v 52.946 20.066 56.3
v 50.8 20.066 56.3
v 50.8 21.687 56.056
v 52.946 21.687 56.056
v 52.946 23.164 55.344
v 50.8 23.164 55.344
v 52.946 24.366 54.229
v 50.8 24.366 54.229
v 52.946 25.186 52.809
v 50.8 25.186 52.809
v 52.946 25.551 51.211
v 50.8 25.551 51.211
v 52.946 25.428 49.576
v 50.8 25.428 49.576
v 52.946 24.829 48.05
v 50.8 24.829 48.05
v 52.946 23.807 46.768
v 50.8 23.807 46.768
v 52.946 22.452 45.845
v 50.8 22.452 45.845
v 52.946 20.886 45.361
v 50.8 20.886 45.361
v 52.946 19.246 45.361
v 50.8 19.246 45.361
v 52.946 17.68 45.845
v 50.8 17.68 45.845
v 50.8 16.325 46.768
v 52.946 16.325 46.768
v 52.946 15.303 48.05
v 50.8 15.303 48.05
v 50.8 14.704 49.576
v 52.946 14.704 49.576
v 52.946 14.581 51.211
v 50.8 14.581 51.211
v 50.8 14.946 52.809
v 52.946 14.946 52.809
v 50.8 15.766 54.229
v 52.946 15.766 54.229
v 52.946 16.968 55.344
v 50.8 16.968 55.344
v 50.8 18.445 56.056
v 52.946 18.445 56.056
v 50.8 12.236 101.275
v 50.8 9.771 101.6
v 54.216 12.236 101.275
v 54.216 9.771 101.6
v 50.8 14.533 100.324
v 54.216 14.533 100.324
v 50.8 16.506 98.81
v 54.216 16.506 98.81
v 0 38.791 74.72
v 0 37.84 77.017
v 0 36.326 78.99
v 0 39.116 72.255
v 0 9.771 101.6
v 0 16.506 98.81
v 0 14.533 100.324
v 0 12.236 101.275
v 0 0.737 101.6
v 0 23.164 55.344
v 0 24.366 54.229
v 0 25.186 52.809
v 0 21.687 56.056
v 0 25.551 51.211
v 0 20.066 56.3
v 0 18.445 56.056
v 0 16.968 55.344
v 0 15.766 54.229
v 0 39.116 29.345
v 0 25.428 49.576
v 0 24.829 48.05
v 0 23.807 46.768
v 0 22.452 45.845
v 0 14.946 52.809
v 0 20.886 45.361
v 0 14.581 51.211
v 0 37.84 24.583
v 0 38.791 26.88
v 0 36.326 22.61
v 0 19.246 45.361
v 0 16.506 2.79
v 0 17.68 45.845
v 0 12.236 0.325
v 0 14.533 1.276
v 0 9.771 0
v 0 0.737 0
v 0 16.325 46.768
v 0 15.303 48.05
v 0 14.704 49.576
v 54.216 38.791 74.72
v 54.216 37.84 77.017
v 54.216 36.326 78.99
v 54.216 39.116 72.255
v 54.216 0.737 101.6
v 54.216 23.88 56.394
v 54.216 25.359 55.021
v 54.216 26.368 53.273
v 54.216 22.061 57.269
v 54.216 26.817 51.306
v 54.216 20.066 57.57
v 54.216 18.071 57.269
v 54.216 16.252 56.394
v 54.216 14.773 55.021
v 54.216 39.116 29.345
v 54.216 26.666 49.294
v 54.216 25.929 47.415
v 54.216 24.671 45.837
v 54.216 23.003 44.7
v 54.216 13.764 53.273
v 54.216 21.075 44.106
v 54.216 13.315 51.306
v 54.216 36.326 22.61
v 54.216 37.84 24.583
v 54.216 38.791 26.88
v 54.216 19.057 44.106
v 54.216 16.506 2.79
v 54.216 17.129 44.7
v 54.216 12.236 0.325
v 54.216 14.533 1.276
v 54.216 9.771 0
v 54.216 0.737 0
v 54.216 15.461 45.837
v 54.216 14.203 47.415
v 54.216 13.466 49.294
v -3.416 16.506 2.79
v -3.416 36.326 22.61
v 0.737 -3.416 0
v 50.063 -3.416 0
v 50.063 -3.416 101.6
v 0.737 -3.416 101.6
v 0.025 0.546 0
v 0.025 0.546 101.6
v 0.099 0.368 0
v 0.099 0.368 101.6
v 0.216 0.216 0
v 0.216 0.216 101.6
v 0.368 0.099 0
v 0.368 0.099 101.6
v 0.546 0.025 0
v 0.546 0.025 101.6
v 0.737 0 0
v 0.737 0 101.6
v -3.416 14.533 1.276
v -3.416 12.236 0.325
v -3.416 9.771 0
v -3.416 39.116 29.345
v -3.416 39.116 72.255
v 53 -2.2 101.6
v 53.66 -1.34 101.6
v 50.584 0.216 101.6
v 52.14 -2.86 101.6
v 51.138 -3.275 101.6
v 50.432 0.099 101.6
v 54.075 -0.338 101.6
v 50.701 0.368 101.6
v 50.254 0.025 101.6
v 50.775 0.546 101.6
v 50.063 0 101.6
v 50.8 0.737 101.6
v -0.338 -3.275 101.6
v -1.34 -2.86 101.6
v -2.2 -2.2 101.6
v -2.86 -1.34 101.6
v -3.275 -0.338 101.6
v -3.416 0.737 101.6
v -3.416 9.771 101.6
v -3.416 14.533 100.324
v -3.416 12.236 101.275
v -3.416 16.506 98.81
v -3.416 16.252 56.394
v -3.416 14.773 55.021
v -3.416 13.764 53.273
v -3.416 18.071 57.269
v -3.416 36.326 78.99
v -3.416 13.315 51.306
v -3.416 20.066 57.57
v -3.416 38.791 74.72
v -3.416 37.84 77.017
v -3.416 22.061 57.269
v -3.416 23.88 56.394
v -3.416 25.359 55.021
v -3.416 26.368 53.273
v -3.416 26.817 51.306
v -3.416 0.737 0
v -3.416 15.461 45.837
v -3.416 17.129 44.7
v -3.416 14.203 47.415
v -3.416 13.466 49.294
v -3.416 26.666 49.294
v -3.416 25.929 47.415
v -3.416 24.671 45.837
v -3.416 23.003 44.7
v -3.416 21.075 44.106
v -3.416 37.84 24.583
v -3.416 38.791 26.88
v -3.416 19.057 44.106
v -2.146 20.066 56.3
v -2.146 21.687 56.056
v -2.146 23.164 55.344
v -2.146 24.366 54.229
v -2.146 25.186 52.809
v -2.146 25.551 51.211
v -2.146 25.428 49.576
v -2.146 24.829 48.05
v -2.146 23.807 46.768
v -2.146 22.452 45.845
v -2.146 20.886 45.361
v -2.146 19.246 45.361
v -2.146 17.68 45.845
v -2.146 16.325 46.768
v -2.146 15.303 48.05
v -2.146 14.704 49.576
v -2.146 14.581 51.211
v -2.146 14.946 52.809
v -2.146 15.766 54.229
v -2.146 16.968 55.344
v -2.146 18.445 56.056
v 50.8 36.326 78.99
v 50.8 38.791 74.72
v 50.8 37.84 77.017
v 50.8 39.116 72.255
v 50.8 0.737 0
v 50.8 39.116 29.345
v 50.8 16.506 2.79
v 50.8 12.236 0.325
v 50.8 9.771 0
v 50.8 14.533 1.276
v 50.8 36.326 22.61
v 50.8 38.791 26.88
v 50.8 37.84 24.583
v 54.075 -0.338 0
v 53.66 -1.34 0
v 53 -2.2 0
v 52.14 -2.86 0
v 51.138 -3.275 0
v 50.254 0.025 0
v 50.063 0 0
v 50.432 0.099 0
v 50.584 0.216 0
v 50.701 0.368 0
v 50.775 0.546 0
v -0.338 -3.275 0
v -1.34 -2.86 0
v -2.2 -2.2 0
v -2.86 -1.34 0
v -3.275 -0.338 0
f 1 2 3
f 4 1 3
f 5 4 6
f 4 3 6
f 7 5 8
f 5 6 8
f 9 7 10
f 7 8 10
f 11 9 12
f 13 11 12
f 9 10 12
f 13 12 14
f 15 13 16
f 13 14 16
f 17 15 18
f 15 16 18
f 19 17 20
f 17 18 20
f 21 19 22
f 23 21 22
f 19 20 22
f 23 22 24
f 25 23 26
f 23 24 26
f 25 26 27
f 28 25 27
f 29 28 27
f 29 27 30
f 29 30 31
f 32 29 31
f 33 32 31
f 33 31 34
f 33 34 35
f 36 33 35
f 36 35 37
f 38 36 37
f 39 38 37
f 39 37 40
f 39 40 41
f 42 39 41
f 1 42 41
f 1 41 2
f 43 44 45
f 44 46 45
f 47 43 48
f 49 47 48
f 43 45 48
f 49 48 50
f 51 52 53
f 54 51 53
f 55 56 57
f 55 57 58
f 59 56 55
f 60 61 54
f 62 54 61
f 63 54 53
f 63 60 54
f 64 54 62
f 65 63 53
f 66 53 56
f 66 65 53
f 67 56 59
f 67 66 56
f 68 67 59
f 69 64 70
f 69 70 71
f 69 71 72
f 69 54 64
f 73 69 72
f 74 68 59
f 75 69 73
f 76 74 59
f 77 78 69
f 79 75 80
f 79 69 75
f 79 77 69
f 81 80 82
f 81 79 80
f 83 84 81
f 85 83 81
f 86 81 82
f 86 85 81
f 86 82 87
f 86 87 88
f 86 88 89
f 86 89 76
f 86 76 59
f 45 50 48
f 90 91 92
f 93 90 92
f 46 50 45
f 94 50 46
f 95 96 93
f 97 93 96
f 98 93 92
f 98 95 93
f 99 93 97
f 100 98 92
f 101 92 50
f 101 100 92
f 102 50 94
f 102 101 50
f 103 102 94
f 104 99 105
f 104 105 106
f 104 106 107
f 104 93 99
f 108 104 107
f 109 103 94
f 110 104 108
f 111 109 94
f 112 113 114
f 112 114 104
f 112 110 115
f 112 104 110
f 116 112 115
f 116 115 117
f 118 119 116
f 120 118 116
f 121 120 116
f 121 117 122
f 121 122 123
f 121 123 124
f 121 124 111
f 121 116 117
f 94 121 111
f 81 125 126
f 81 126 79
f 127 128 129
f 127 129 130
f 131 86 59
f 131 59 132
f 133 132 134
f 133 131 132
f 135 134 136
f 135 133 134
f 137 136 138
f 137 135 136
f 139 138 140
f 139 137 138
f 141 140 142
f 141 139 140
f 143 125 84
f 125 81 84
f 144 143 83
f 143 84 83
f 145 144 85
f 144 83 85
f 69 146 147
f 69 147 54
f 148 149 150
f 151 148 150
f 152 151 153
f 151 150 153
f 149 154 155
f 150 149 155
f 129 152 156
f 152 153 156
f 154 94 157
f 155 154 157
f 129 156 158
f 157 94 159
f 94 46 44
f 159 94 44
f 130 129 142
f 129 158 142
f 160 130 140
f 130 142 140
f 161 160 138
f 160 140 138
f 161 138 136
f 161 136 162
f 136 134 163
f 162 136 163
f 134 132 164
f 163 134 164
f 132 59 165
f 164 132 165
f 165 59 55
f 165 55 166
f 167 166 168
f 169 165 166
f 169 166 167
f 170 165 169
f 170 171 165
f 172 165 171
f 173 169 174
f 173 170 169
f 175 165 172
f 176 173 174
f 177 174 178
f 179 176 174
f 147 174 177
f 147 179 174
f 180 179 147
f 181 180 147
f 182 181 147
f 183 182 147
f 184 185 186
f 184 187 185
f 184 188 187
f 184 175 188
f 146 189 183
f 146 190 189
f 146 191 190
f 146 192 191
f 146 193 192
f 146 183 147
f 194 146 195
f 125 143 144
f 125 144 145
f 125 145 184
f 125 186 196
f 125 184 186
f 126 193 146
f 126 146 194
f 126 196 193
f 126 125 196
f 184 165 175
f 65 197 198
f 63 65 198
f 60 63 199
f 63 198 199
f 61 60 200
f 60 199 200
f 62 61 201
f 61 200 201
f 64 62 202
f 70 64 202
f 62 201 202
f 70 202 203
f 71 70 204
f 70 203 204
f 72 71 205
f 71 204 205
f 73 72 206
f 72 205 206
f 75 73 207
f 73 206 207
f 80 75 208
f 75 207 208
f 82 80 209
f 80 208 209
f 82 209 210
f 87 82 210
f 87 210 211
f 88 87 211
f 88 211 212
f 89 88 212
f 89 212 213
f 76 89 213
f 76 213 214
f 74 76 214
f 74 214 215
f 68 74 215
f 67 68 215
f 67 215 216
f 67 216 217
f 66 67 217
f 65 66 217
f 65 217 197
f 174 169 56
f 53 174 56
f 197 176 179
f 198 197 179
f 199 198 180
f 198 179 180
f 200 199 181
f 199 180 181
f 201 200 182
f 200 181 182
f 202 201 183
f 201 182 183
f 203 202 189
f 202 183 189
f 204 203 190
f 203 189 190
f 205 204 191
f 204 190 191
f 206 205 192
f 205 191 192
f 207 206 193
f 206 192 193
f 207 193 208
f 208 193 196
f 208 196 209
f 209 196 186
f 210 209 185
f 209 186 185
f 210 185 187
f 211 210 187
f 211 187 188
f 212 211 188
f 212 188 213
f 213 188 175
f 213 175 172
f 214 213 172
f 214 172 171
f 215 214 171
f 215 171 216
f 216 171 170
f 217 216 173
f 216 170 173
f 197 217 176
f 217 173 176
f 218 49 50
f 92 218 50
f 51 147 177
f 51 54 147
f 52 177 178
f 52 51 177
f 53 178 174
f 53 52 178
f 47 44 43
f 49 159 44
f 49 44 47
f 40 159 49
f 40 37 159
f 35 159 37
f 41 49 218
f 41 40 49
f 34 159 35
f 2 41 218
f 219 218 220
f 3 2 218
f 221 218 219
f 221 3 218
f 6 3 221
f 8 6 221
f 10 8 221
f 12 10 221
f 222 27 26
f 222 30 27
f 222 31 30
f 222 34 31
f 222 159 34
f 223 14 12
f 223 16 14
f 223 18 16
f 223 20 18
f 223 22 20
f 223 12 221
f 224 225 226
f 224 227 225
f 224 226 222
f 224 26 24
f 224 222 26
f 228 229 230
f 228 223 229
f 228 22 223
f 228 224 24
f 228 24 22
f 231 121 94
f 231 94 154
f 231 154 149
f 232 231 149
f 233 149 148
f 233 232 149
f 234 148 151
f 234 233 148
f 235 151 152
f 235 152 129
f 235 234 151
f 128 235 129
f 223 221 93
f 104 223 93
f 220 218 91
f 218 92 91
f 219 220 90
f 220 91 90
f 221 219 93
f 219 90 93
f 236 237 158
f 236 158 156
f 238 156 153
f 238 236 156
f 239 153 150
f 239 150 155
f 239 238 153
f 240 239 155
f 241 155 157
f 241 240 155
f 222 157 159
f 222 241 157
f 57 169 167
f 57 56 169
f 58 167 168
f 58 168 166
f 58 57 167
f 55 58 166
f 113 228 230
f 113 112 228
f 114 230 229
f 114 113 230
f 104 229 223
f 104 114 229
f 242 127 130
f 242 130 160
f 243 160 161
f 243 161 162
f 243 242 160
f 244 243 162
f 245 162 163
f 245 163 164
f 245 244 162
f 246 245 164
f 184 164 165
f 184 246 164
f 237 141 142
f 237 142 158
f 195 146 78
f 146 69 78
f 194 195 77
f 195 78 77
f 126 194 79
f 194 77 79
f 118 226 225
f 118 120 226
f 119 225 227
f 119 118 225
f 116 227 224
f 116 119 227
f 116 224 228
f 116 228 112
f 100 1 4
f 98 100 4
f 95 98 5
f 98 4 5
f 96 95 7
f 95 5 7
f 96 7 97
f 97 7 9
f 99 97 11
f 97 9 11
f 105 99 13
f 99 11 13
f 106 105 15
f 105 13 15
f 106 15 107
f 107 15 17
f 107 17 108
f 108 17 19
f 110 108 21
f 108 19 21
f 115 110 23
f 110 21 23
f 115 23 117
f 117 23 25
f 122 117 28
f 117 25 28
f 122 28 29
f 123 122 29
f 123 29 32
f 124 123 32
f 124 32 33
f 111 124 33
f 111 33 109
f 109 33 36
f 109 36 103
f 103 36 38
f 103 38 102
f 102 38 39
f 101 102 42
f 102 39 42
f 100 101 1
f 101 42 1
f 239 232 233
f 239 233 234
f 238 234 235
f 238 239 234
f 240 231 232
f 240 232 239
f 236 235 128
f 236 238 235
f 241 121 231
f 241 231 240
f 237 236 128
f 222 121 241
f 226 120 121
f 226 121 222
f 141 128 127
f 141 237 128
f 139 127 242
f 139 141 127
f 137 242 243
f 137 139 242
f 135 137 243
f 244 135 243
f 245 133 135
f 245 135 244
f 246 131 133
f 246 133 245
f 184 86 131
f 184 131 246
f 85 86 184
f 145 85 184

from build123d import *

# Parameters (mm, degrees)
BASE_FLANGE1_DEPTH        = 101.6
CHAMFER1_SIZE             = 25.4
FILLET1_R                 = 9.525
M10_CLEARANCE_HOLE1_D     = 11
M10_CLEARANCE_HOLE1_DEPTH = 57.658
M10_CLEARANCE_HOLE1_TIP   = 3.304733405
CHAMFER2_SIZE             = 1.27


# Sheet-metal steps are written as plain solids
with BuildPart() as part:
    # Sketch1 → Base-Flange1 (new body)
    with BuildSketch(Plane.XY):
        with BuildLine():
            Line((0, 39.116), (0, 0.7366))
            ThreePointArc((0, 0.7366), (0.215745145, 0.215745145), (0.7366, 0))
            Line((0.7366, 0), (50.0634, 0))
            ThreePointArc((50.0634, 0), (50.584254855, 0.215745145), (50.8, 0.7366))
            Line((50.8, 0.7366), (50.8, 39.116))
            Line((50.8, 39.116), (54.2163, 39.116))
            Line((54.2163, 39.116), (54.2163, 0.7366))
            ThreePointArc((54.2163, 0.7366), (52.999943752, -2.199943752), (50.0634, -3.4163))
            Line((50.0634, -3.4163), (0.7366, -3.4163))
            ThreePointArc((0.7366, -3.4163), (-2.199943752, -2.199943752), (-3.4163, 0.7366))
            Line((-3.4163, 0.7366), (-3.4163, 39.116))
            Line((-3.4163, 39.116), (0, 39.116))
        make_face()
    extrude(amount=BASE_FLANGE1_DEPTH)

    # Chamfer1
    chamfer1_edges = [part.edges().sort_by_distance(p)[0] for p in [
        (-1.70815, 39.116, 0),
        (52.50815, 39.116, 0),
        (-1.70815, 39.116, 101.6),
        (52.50815, 39.116, 101.6),
    ]]
    chamfer(chamfer1_edges, length=CHAMFER1_SIZE)

    # Fillet1
    fillet1_edges = [part.edges().sort_by_distance(p)[0] for p in [
        (52.50815, 13.716, 0),
        (52.50815, 39.116, 76.2),
        (52.50815, 39.116, 25.4),
        (52.50815, 13.716, 101.6),
        (-1.70815, 13.716, 0),
        (-1.70815, 39.116, 76.2),
        (-1.70815, 39.116, 25.4),
        (-1.70815, 13.716, 101.6),
    ]]
    fillet(fillet1_edges, radius=FILLET1_R)

    # M10 Clearance Hole1
    with Locations(Plane(origin=(54.2163, 0, 0), x_dir=(0, 0, -1), z_dir=(1, 0, 0))):
        with Locations((-50.8, 20.066)):
            Hole(M10_CLEARANCE_HOLE1_D / 2, depth=M10_CLEARANCE_HOLE1_DEPTH)
            with Locations((0, 0, -(M10_CLEARANCE_HOLE1_DEPTH + M10_CLEARANCE_HOLE1_TIP / 2))):  # 118° drill point
                Cone(0, M10_CLEARANCE_HOLE1_D / 2, M10_CLEARANCE_HOLE1_TIP, mode=Mode.SUBTRACT)

    # Chamfer2
    chamfer2_edges = [part.edges().sort_by_distance(p)[0] for p in [
        (-3.4163, 20.066, 45.3),
        (54.2163, 20.066, 45.3),
    ]]
    chamfer(chamfer2_edges, length=CHAMFER2_SIZE)


solid = part.part
